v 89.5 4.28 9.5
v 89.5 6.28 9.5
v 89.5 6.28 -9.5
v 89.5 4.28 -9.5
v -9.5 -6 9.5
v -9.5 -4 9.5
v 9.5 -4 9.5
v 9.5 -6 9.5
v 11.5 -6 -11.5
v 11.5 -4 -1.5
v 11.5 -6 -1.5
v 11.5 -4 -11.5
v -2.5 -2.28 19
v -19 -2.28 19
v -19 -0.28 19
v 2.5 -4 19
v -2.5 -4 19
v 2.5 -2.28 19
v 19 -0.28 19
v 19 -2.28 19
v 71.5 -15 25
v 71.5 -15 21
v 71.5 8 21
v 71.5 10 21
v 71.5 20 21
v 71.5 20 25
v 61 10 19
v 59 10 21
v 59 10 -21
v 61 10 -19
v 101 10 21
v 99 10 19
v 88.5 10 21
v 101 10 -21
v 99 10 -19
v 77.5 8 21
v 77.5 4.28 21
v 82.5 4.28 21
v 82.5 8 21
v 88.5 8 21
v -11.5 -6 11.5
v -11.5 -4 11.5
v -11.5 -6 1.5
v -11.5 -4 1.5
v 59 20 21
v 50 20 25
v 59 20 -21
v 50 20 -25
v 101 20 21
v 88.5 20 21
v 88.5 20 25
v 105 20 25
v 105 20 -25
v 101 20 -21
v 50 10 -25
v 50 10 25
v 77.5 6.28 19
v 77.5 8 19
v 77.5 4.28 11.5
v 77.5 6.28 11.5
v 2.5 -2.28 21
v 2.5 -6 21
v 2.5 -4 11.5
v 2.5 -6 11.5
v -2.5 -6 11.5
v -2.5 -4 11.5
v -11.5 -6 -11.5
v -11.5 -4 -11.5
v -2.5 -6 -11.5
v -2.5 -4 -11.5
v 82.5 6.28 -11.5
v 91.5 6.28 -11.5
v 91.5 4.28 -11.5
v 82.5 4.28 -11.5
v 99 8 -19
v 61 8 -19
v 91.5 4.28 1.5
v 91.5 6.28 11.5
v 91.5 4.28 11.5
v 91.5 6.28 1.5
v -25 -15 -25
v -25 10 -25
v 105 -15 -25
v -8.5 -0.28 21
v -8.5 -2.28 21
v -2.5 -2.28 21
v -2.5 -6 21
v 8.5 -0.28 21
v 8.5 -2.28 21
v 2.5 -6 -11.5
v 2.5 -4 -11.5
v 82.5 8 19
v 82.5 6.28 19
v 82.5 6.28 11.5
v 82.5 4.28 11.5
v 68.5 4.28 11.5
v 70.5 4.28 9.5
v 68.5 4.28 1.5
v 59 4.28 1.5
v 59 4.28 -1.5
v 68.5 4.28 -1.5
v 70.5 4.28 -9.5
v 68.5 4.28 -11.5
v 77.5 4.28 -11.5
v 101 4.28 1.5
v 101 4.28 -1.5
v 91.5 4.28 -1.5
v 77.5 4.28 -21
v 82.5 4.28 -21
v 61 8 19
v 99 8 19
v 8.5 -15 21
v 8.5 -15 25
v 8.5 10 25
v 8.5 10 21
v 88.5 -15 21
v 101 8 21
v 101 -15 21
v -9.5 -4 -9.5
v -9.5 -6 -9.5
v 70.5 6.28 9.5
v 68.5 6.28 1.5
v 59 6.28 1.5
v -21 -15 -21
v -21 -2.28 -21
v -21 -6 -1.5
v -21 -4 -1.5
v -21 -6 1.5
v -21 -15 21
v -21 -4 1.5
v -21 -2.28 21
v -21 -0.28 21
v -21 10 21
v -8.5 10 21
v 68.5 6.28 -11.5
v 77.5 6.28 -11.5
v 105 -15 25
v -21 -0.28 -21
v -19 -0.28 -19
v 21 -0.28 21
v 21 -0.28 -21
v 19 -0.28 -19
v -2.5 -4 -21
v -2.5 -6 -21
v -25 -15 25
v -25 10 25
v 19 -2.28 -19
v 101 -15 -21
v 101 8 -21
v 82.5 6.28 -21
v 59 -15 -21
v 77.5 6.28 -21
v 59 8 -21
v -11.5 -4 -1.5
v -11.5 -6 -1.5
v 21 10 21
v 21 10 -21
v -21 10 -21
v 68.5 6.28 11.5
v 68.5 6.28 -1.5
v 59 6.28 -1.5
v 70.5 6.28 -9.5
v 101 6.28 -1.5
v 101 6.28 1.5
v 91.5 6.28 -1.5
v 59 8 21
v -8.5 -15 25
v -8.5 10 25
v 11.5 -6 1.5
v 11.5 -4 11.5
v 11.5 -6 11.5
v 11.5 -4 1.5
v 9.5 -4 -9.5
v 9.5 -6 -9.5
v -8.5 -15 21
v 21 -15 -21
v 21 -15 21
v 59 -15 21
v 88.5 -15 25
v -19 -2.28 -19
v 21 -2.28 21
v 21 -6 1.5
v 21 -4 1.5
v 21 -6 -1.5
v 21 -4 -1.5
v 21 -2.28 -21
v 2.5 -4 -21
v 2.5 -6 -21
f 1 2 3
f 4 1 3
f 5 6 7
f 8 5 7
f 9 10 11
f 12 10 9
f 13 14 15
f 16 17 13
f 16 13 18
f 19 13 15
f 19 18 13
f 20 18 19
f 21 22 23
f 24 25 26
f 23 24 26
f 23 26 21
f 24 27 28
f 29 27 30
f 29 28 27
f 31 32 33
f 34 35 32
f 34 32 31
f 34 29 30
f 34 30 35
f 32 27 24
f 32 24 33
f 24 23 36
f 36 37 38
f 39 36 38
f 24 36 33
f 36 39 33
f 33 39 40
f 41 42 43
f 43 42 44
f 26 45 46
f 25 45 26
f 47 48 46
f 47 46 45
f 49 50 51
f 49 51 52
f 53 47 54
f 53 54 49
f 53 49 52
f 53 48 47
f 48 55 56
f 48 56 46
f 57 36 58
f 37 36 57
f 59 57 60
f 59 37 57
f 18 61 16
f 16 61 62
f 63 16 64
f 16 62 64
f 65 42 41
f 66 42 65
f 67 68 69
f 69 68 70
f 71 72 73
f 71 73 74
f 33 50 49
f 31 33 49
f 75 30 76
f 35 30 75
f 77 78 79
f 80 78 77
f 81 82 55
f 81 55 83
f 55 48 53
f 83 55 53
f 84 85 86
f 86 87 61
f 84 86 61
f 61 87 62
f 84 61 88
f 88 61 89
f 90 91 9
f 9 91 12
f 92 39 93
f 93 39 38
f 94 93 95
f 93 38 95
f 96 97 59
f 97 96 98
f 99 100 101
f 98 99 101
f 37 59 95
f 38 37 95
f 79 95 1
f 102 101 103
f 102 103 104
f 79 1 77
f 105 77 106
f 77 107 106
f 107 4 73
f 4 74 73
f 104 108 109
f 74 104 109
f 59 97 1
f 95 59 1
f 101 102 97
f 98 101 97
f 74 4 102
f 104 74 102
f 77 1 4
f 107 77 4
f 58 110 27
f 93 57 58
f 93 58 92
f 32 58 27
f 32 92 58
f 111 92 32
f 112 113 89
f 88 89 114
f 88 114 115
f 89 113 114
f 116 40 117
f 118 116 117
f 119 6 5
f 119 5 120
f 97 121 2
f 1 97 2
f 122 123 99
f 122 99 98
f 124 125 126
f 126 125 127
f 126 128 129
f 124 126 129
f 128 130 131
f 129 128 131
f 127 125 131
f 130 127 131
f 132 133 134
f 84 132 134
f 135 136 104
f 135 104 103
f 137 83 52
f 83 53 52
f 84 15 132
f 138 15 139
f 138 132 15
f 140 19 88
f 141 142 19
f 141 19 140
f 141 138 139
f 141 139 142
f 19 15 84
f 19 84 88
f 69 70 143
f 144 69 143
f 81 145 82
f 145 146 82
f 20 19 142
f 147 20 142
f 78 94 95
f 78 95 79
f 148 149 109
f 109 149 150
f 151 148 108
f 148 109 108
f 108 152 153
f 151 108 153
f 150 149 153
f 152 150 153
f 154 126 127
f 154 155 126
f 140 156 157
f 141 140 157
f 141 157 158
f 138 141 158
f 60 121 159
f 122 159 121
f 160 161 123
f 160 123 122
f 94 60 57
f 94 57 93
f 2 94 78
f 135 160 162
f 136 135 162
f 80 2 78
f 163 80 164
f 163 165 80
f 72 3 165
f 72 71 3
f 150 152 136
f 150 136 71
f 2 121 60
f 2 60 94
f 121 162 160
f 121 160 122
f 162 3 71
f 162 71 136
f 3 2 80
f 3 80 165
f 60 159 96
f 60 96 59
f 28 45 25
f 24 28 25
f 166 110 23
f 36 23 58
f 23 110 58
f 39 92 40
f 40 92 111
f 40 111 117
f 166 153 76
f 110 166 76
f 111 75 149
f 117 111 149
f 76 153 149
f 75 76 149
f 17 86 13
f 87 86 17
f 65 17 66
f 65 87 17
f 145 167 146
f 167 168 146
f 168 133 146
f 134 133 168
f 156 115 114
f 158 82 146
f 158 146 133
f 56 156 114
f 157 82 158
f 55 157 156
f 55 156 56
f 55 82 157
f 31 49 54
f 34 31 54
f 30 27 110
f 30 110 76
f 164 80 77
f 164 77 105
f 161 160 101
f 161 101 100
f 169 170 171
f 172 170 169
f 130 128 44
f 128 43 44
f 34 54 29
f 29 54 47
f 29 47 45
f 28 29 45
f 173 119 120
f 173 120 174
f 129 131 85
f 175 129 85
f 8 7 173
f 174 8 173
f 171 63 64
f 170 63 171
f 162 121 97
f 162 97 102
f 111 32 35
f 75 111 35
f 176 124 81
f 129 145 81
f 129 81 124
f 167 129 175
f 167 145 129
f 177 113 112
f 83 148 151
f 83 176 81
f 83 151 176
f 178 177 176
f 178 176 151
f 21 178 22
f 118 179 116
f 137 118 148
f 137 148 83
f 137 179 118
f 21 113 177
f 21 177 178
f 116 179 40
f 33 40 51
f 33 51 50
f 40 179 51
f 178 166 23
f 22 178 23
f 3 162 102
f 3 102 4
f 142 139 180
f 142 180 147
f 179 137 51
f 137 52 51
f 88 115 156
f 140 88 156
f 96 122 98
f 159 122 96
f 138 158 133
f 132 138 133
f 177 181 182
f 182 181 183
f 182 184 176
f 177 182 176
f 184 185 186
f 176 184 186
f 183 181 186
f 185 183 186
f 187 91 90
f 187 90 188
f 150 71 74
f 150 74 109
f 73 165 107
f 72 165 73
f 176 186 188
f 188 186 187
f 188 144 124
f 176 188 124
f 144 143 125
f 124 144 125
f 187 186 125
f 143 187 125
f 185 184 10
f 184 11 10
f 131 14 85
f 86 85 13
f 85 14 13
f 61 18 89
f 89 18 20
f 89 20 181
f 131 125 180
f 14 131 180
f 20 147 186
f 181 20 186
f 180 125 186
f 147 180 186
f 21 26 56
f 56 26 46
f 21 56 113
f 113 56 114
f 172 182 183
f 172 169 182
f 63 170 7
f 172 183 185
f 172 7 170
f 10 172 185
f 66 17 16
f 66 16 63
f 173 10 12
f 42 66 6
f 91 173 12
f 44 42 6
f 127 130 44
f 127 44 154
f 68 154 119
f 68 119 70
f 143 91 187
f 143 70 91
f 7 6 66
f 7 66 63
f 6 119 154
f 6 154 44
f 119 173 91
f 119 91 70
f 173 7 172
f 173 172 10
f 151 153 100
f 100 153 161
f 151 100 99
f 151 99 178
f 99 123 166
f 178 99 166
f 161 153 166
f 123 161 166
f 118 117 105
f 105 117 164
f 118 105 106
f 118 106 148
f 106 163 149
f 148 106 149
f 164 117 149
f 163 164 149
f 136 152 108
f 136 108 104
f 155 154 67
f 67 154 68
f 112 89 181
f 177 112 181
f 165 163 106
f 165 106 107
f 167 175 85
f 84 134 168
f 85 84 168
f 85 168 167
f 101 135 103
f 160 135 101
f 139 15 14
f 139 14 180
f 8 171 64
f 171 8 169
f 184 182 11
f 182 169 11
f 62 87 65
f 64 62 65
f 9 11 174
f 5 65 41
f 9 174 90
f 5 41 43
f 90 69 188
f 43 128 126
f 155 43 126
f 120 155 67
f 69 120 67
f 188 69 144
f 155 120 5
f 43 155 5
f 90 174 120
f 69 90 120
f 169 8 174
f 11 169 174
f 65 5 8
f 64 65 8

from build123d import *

# Parameters (mm, degrees)
SKETCH1_W               = 42
SKETCH1_H               = 42
BOSS_EXTRUDE4_DEPTH     = 10
CUT_EXTRUDE3_DEPTH      = 117.726175299
CUT_EXTRUDE3_DEPTH_BACK = 4
SKETCH5_W               = 17
SKETCH5_H               = 10
BOSS_EXTRUDE5_DEPTH     = 10
CUT_EXTRUDE5_DEPTH      = 119.004237212
CUT_EXTRUDE5_DEPTH_BACK = 119.004237212
SKETCH8_W               = 10
SKETCH8_H               = 10
BOSS_EXTRUDE6_DEPTH     = 15
BOSS_EXTRUDE7_START     = -10.28
SKETCH10_W              = 42
SKETCH10_H              = 42
SKETCH10_W_2            = 38
SKETCH10_H_2            = 38
BOSS_EXTRUDE7_DEPTH     = 2
BOSS_EXTRUDE8_START     = -10
SKETCH11_W              = 42
SKETCH11_H              = 42
SKETCH11_W_2            = 38
SKETCH11_H_2            = 38
BOSS_EXTRUDE8_DEPTH     = 2
SKETCH12_W              = 5
SKETCH12_H              = 7.5
SKETCH12_H_2            = 6
SKETCH12_W_2            = 23
SKETCH12_H_3            = 23
SKETCH12_W_3            = 19
SKETCH12_H_4            = 19
SKETCH12_H_5            = 2
SKETCH12_W_4            = 7.5
SKETCH12_H_6            = 3
SKETCH12_W_5            = 2
BOSS_EXTRUDE9_DEPTH     = 2
SKETCH15_W              = 5
SKETCH15_H              = 2
BOSS_EXTRUDE12_DEPTH    = 1.72
SKETCH16_W              = 3
SKETCH16_H              = 2
BOSS_EXTRUDE13_DEPTH    = 2
SKETCH17_W              = 3
SKETCH17_H              = 2
BOSS_EXTRUDE14_DEPTH    = 2
SKETCH19_W              = 19
SKETCH19_H              = 8
BOSS_EXTRUDE15_DEPTH    = 2
SKETCH20_W              = 19
SKETCH20_H              = 19
CUT_EXTRUDE6_DEPTH      = 2
SKETCH21_W              = 5
SKETCH21_H              = 2
BOSS_EXTRUDE16_DEPTH    = 2


with BuildPart() as part:
    # Sketch1 → Boss-Extrude4 (new body)
    with BuildSketch(Plane(origin=(0, 0, 0), x_dir=(1, 0, 0), z_dir=(0, 1, 0))):
        Polygon((-25, -25), (25, -25), (55, -25), (105, -25), (105, 25), (55, 25), (25, 25), (-25, 25), align=None)
        with Locations((80, 0)):
            Rectangle(SKETCH1_W, SKETCH1_H, mode=Mode.SUBTRACT)
        Rectangle(SKETCH1_W, SKETCH1_H, mode=Mode.SUBTRACT)
    extrude(amount=BOSS_EXTRUDE4_DEPTH)

    # Sketch5 → Cut-Extrude3 (cut, two sides: drawn at the far end of the back side and taken through both)
    with BuildSketch(Plane.XY.offset(25).offset(-CUT_EXTRUDE3_DEPTH_BACK)):
        with Locations((0, 5)):
            Rectangle(SKETCH5_W, SKETCH5_H)
        with Locations((80, 5)):
            Rectangle(SKETCH5_W, SKETCH5_H)
    extrude(amount=CUT_EXTRUDE3_DEPTH + CUT_EXTRUDE3_DEPTH_BACK, mode=Mode.SUBTRACT)

    # Sketch6 → Boss-Extrude5 (add)
    with BuildSketch(Plane(origin=(0, 10, 0), x_dir=(1, 0, 0), z_dir=(0, 1, 0))):
        Polygon((105, 25), (40, 25), (40, -25), (71.5, -25), (71.5, -21), (59, -21), (59, 21), (101, 21), (101, -21), (88.5, -21), (88.5, -25), (105, -25), align=None)
    extrude(amount=BOSS_EXTRUDE5_DEPTH)

    # Sketch8 → Cut-Extrude5 (cut, two sides: drawn at the far end of the back side and taken through both)
    with BuildSketch(Plane.XY.offset(25).offset(-CUT_EXTRUDE5_DEPTH_BACK)):
        with Locations((45, 15)):
            Rectangle(SKETCH8_W, SKETCH8_H)
    extrude(amount=CUT_EXTRUDE5_DEPTH + CUT_EXTRUDE5_DEPTH_BACK, mode=Mode.SUBTRACT)

    # Sketch9 → Boss-Extrude6 (add)
    with BuildSketch(Plane.XZ):
        Polygon((-21, 21), (-8.5, 21), (-8.5, 25), (-25, 25), (-25, -25), (105, -25), (105, 25), (88.5, 25), (88.5, 21), (101, 21), (101, -21), (59, -21), (59, 21), (71.5, 21), (71.5, 25), (8.5, 25), (8.5, 21), (21, 21), (21, -21), (-21, -21), align=None)
    extrude(amount=BOSS_EXTRUDE6_DEPTH)

    # Sketch10 → Boss-Extrude7 (add)
    with BuildSketch(Plane(origin=(0, 10, 0), x_dir=(1, 0, 0), z_dir=(0, 1, 0)).offset(BOSS_EXTRUDE7_START)):
        Rectangle(SKETCH10_W, SKETCH10_H)
        Rectangle(SKETCH10_W_2, SKETCH10_H_2, mode=Mode.SUBTRACT)
    extrude(amount=-BOSS_EXTRUDE7_DEPTH)

    # Sketch11 → Boss-Extrude8 (add)
    with BuildSketch(Plane(origin=(0, 20, 0), x_dir=(1, 0, 0), z_dir=(0, 1, 0)).offset(BOSS_EXTRUDE8_START)):
        with Locations((80, 0)):
            Rectangle(SKETCH11_W, SKETCH11_H)
        with Locations((80, 0)):
            Rectangle(SKETCH11_W_2, SKETCH11_H_2, mode=Mode.SUBTRACT)
    extrude(amount=-BOSS_EXTRUDE8_DEPTH)

    # Sketch12 → Boss-Extrude9 (add)
    # profile 1 of 10: a face of its own
    with BuildSketch(Plane(origin=(0, -4, 0), x_dir=(1, 0, 0), z_dir=(0, 1, 0))):
        with Locations((0, 15.25)):
            Rectangle(SKETCH12_W, SKETCH12_H)
    # profile 2 of 10: a face of its own
    with BuildSketch(Plane(origin=(0, -4, 0), x_dir=(1, 0, 0), z_dir=(0, 1, 0))):
        with Locations((0, 22)):
            Rectangle(SKETCH12_W, SKETCH12_H_2)
    # profile 3 of 10: a face of its own
    with BuildSketch(Plane(origin=(0, -4, 0), x_dir=(1, 0, 0), z_dir=(0, 1, 0))):
        Rectangle(SKETCH12_W_2, SKETCH12_H_3)
        Rectangle(SKETCH12_W_3, SKETCH12_H_4, mode=Mode.SUBTRACT)
    # profile 4 of 10: a face of its own
    with BuildSketch(Plane(origin=(0, -4, 0), x_dir=(1, 0, 0), z_dir=(0, 1, 0))):
        with Locations((0, -15.25)):
            Rectangle(SKETCH12_W, SKETCH12_H)
    # profile 5 of 10: a face of its own
    with BuildSketch(Plane(origin=(0, -4, 0), x_dir=(1, 0, 0), z_dir=(0, 1, 0))):
        with Locations((0, -20)):
            Rectangle(SKETCH12_W, SKETCH12_H_5)
    # profile 6 of 10: a face of its own
    with BuildSketch(Plane(origin=(0, -4, 0), x_dir=(1, 0, 0), z_dir=(0, 1, 0))):
        with Locations((-15.25, 0)):
            Rectangle(SKETCH12_W_4, SKETCH12_H_6)
    # profile 7 of 10: a face of its own
    with BuildSketch(Plane(origin=(0, -4, 0), x_dir=(1, 0, 0), z_dir=(0, 1, 0))):
        with Locations((-10.5, 0)):
            Rectangle(SKETCH12_W_5, SKETCH12_H_6)
    # profile 8 of 10: a face of its own
    with BuildSketch(Plane(origin=(0, -4, 0), x_dir=(1, 0, 0), z_dir=(0, 1, 0))):
        Polygon((-9.5, -1.5), (-11.5, -1.5), (-11.5, -11.5), (-2.5, -11.5), (2.5, -11.5), (11.5, -11.5), (11.5, -1.5), (9.5, -1.5), (9.5, -9.5), (2.5, -9.5), (-2.5, -9.5), (-9.5, -9.5), align=None)
    # profile 9 of 10: a face of its own
    with BuildSketch(Plane(origin=(0, -4, 0), x_dir=(1, 0, 0), z_dir=(0, 1, 0))):
        with Locations((10.5, 0)):
            Rectangle(SKETCH12_W_5, SKETCH12_H_6)
    # profile 10 of 10: a face of its own
    with BuildSketch(Plane(origin=(0, -4, 0), x_dir=(1, 0, 0), z_dir=(0, 1, 0))):
        with Locations((15.25, 0)):
            Rectangle(SKETCH12_W_4, SKETCH12_H_6)
    extrude(amount=-BOSS_EXTRUDE9_DEPTH)

    # Sketch15 → Boss-Extrude12 (add)
    with BuildSketch(Plane(origin=(0, -4, 0), x_dir=(1, 0, 0), z_dir=(0, 1, 0))):
        with Locations((0, -20)):
            Rectangle(SKETCH15_W, SKETCH15_H)
    extrude(amount=BOSS_EXTRUDE12_DEPTH)

    # Sketch16 → Boss-Extrude13 (add)
    with BuildSketch(Plane.ZY.offset(19)):
        with Locations((0, -5)):
            Rectangle(SKETCH16_W, SKETCH16_H)
    extrude(amount=BOSS_EXTRUDE13_DEPTH)

    # Sketch17 → Boss-Extrude14 (add)
    with BuildSketch(Plane(origin=(19, 0, 0), x_dir=(0, 0, -1), z_dir=(1, 0, 0))):
        with Locations((0, -5)):
            Rectangle(SKETCH17_W, SKETCH17_H)
    extrude(amount=BOSS_EXTRUDE14_DEPTH)

    # Sketch19 → Boss-Extrude15 (add)
    with BuildSketch(Plane(origin=(0, 6.28, 0), x_dir=(1, 0, 0), z_dir=(0, 1, 0))):
        Polygon((91.5, 11.5), (82.5, 11.5), (82.5, 21), (77.5, 21), (77.5, 11.5), (68.5, 11.5), (68.5, 1.5), (59, 1.5), (59, -1.5), (68.5, -1.5), (68.5, -11.5), (77.5, -11.5), (77.5, -21), (82.5, -21), (82.5, -11.5), (91.5, -11.5), (91.5, -1.5), (101, -1.5), (101, 1.5), (91.5, 1.5), align=None)
        with Locations((80, -5.5)):
            Rectangle(SKETCH19_W, SKETCH19_H, mode=Mode.SUBTRACT)
        with Locations((80, 5.5)):
            Rectangle(SKETCH19_W, SKETCH19_H, mode=Mode.SUBTRACT)
    extrude(amount=-BOSS_EXTRUDE15_DEPTH)

    # Sketch20 → Cut-Extrude6 (cut)
    with BuildSketch(Plane(origin=(0, 6.28, 0), x_dir=(1, 0, 0), z_dir=(0, 1, 0))):
        with Locations((80, 0)):
            Rectangle(SKETCH20_W, SKETCH20_H)
    extrude(amount=-CUT_EXTRUDE6_DEPTH, mode=Mode.SUBTRACT)

    # Sketch21 → Boss-Extrude16 (add)
    with BuildSketch(Plane(origin=(0, 6.28, 0), x_dir=(1, 0, 0), z_dir=(0, 1, 0))):
        with Locations((80, -20)):
            Rectangle(SKETCH21_W, SKETCH21_H)
    extrude(amount=BOSS_EXTRUDE16_DEPTH)


solid = part.part
